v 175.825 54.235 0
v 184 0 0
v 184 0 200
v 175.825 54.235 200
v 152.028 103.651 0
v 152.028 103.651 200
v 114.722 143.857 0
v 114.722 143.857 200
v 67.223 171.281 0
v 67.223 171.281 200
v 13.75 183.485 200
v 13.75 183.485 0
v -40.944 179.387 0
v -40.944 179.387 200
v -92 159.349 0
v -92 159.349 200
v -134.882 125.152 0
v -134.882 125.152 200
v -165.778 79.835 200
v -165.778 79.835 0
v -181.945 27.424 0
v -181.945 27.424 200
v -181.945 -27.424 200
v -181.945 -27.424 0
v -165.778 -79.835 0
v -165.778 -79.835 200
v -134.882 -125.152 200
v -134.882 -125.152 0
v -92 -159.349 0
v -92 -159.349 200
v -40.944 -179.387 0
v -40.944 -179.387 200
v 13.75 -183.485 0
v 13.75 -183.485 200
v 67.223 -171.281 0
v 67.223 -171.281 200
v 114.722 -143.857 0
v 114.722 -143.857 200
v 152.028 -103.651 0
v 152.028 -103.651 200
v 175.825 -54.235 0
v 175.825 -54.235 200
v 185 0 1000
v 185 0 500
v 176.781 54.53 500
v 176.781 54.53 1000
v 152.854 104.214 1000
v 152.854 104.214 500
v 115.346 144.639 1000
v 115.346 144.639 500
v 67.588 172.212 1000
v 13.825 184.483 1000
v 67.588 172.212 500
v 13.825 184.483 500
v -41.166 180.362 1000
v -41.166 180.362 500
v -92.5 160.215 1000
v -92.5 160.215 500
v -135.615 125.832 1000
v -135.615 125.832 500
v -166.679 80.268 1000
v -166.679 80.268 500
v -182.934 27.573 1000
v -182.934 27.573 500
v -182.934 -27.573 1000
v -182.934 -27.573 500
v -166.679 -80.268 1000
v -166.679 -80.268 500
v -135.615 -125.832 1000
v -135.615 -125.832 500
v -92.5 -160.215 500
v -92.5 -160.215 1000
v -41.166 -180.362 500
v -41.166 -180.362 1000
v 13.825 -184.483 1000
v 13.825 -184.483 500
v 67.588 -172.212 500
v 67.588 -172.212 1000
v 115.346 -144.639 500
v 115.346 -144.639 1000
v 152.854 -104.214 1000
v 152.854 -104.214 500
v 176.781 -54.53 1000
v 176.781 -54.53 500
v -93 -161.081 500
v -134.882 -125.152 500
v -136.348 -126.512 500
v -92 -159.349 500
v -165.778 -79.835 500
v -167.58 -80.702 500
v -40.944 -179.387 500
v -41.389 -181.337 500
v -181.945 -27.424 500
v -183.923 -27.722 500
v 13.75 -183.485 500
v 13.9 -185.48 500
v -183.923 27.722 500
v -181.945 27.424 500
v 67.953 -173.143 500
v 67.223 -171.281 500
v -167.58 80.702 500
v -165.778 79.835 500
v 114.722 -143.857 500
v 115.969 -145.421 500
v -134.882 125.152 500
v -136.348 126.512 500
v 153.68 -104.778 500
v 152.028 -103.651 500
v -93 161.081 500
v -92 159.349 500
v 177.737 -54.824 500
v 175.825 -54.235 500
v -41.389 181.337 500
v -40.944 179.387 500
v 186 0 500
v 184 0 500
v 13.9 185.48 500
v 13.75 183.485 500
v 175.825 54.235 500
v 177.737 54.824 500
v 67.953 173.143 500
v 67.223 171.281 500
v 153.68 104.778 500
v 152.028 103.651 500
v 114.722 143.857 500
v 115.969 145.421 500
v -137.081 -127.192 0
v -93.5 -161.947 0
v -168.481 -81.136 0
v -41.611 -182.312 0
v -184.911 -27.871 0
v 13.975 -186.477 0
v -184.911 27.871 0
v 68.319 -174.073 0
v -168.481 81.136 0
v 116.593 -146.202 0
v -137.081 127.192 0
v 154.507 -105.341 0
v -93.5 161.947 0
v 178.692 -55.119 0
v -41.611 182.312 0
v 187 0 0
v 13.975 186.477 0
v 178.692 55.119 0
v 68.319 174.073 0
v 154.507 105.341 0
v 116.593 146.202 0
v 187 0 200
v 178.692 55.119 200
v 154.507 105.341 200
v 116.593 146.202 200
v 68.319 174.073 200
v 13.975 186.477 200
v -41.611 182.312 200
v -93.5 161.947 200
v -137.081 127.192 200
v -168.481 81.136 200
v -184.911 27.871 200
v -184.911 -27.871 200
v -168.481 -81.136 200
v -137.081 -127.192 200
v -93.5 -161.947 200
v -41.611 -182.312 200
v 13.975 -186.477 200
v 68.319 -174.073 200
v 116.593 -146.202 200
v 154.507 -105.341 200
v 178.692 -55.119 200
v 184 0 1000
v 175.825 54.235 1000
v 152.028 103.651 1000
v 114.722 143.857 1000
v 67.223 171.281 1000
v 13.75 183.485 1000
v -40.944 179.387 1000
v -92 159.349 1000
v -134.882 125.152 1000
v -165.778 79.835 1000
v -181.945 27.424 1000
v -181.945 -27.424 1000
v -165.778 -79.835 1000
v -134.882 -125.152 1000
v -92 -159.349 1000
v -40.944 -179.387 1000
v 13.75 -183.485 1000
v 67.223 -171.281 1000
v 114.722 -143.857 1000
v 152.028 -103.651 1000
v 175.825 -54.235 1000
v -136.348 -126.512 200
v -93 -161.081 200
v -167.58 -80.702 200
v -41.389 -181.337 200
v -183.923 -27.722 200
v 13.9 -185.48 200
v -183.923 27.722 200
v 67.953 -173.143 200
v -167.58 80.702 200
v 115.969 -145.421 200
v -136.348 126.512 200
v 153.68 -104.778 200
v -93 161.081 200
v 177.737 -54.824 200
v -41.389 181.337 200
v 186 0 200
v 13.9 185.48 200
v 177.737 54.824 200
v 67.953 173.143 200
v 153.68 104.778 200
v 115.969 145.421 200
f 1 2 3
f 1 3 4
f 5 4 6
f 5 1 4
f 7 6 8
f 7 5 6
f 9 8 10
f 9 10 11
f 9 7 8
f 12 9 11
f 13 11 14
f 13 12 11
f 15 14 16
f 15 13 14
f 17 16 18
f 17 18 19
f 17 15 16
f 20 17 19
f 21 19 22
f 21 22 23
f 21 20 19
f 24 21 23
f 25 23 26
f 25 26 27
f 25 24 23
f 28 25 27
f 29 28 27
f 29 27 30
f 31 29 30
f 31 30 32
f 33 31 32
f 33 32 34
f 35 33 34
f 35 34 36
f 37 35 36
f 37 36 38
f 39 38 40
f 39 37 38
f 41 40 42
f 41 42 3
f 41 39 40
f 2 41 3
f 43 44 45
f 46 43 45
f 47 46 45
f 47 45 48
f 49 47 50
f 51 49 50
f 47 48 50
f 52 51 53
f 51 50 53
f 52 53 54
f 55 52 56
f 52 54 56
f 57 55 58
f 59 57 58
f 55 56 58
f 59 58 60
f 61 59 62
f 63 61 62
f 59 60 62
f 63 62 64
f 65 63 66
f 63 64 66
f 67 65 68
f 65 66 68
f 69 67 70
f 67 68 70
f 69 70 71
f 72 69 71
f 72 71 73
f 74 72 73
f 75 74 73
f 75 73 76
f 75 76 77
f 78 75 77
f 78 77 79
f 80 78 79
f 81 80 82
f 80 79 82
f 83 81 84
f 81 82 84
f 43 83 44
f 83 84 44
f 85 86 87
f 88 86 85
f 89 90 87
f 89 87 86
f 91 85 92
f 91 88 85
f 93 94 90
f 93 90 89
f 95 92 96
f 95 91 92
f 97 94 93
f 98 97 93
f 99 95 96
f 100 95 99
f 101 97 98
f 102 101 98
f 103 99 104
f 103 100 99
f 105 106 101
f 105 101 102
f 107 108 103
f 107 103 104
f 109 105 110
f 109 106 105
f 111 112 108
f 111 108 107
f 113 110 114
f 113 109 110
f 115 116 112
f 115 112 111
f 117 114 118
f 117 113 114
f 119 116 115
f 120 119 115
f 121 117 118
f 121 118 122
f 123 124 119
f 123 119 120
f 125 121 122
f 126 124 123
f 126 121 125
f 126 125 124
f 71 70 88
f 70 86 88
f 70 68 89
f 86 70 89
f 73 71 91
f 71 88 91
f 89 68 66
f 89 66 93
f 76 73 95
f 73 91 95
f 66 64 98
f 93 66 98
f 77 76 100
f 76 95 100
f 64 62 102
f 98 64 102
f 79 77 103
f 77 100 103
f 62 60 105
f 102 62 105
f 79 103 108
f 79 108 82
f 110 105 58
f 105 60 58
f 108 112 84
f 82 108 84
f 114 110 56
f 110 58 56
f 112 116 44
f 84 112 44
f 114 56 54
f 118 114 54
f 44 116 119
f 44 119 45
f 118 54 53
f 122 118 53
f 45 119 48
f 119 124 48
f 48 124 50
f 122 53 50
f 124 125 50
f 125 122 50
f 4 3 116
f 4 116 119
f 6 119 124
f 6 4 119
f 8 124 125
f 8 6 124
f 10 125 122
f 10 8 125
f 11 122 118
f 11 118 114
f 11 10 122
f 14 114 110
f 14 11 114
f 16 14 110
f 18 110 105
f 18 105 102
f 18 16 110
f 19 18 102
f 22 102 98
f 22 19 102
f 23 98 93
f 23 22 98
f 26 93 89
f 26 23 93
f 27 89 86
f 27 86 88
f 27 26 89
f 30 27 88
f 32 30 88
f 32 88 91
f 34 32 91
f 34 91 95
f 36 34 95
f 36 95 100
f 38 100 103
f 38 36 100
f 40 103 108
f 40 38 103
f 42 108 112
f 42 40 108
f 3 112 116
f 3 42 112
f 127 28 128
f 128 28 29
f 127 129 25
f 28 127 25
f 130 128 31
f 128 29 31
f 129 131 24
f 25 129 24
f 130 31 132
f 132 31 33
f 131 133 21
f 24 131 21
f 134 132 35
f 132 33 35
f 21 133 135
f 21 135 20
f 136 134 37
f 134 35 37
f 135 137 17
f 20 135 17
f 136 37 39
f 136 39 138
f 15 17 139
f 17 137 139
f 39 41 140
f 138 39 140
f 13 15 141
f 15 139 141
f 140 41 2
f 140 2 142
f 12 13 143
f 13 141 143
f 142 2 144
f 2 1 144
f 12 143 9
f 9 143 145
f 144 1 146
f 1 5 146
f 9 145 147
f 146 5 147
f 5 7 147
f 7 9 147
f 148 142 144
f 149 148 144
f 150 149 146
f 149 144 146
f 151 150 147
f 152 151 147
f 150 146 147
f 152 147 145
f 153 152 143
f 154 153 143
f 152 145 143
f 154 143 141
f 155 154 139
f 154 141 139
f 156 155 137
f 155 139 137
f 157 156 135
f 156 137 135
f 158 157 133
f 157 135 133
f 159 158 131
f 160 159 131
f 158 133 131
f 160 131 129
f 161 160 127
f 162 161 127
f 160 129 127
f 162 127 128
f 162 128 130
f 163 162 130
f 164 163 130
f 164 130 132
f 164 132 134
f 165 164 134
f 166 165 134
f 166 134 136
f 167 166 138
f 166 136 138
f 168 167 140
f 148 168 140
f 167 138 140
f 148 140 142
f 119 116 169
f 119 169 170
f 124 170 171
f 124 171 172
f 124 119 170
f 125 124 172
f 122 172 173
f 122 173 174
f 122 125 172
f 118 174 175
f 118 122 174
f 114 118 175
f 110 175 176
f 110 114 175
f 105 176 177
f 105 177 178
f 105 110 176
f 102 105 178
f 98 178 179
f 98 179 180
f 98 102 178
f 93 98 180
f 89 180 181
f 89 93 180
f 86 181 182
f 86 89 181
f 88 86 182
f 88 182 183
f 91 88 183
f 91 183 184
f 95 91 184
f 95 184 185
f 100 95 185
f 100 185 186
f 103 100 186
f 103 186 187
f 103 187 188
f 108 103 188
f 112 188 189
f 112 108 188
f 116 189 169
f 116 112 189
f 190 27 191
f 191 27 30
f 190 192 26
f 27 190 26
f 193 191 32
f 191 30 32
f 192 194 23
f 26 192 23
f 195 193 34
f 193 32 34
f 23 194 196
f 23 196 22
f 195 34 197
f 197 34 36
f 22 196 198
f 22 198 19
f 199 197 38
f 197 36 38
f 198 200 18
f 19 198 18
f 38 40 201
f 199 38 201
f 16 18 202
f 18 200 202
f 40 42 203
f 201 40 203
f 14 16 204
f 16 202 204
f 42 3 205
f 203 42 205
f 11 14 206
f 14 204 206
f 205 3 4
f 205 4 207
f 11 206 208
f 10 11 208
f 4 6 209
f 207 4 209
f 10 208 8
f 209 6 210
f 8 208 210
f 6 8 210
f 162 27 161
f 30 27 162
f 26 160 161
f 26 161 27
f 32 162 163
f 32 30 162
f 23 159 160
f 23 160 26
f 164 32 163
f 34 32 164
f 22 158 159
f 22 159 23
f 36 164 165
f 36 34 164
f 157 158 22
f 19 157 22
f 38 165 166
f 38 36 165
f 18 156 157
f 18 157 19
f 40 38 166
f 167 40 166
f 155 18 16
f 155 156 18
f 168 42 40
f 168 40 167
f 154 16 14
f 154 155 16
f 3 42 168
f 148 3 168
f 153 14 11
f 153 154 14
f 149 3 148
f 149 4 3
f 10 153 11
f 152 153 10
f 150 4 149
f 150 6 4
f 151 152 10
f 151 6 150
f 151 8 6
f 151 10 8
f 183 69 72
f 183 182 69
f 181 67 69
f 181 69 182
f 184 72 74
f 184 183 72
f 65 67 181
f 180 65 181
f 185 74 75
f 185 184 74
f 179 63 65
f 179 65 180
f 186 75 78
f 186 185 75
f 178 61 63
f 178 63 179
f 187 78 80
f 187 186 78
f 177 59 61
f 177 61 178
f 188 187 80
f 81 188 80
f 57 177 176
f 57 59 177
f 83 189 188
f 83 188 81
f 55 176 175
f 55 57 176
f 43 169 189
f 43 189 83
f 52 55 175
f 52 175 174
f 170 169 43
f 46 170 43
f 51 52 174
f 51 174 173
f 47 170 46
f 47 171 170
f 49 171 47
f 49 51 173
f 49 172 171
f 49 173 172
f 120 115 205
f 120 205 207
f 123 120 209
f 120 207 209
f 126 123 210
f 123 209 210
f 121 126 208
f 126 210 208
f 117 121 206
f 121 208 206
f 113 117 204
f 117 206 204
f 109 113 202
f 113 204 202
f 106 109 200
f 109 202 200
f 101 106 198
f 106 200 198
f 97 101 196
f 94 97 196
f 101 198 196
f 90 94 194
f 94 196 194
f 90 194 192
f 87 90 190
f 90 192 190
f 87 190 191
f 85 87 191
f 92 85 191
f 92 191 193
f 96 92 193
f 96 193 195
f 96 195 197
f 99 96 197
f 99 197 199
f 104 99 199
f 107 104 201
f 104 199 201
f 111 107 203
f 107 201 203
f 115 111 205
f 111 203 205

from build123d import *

# Parameters (mm, degrees)
SKETCH2_R           = 187
SKETCH2_R_2         = 184
EXTRUDE_THIN1_DEPTH = 200
SKETCH3_R           = 186
SKETCH3_R_2         = 184
EXTRUDE_THIN2_DEPTH = 300
SKETCH4_R           = 185
SKETCH4_R_2         = 184
EXTRUDE_THIN3_DEPTH = 500


with BuildPart() as part:
    # Sketch2 → Extrude-Thin1 (new body)
    with BuildSketch(Plane.XY):
        Circle(SKETCH2_R)
        Circle(SKETCH2_R_2, mode=Mode.SUBTRACT)
    extrude(amount=EXTRUDE_THIN1_DEPTH)


with BuildPart() as body_2:
    # Sketch3 → Extrude-Thin2 (new body)
    with BuildSketch(Plane.XY.offset(200)):
        Circle(SKETCH3_R)
        Circle(SKETCH3_R_2, mode=Mode.SUBTRACT)
    extrude(amount=EXTRUDE_THIN2_DEPTH)


with BuildPart() as body_3:
    # Sketch4 → Extrude-Thin3 (new body)
    with BuildSketch(Plane.XY.offset(500)):
        Circle(SKETCH4_R)
        Circle(SKETCH4_R_2, mode=Mode.SUBTRACT)
    extrude(amount=EXTRUDE_THIN3_DEPTH)


solid = Compound([part.part, body_2.part, body_3.part])
